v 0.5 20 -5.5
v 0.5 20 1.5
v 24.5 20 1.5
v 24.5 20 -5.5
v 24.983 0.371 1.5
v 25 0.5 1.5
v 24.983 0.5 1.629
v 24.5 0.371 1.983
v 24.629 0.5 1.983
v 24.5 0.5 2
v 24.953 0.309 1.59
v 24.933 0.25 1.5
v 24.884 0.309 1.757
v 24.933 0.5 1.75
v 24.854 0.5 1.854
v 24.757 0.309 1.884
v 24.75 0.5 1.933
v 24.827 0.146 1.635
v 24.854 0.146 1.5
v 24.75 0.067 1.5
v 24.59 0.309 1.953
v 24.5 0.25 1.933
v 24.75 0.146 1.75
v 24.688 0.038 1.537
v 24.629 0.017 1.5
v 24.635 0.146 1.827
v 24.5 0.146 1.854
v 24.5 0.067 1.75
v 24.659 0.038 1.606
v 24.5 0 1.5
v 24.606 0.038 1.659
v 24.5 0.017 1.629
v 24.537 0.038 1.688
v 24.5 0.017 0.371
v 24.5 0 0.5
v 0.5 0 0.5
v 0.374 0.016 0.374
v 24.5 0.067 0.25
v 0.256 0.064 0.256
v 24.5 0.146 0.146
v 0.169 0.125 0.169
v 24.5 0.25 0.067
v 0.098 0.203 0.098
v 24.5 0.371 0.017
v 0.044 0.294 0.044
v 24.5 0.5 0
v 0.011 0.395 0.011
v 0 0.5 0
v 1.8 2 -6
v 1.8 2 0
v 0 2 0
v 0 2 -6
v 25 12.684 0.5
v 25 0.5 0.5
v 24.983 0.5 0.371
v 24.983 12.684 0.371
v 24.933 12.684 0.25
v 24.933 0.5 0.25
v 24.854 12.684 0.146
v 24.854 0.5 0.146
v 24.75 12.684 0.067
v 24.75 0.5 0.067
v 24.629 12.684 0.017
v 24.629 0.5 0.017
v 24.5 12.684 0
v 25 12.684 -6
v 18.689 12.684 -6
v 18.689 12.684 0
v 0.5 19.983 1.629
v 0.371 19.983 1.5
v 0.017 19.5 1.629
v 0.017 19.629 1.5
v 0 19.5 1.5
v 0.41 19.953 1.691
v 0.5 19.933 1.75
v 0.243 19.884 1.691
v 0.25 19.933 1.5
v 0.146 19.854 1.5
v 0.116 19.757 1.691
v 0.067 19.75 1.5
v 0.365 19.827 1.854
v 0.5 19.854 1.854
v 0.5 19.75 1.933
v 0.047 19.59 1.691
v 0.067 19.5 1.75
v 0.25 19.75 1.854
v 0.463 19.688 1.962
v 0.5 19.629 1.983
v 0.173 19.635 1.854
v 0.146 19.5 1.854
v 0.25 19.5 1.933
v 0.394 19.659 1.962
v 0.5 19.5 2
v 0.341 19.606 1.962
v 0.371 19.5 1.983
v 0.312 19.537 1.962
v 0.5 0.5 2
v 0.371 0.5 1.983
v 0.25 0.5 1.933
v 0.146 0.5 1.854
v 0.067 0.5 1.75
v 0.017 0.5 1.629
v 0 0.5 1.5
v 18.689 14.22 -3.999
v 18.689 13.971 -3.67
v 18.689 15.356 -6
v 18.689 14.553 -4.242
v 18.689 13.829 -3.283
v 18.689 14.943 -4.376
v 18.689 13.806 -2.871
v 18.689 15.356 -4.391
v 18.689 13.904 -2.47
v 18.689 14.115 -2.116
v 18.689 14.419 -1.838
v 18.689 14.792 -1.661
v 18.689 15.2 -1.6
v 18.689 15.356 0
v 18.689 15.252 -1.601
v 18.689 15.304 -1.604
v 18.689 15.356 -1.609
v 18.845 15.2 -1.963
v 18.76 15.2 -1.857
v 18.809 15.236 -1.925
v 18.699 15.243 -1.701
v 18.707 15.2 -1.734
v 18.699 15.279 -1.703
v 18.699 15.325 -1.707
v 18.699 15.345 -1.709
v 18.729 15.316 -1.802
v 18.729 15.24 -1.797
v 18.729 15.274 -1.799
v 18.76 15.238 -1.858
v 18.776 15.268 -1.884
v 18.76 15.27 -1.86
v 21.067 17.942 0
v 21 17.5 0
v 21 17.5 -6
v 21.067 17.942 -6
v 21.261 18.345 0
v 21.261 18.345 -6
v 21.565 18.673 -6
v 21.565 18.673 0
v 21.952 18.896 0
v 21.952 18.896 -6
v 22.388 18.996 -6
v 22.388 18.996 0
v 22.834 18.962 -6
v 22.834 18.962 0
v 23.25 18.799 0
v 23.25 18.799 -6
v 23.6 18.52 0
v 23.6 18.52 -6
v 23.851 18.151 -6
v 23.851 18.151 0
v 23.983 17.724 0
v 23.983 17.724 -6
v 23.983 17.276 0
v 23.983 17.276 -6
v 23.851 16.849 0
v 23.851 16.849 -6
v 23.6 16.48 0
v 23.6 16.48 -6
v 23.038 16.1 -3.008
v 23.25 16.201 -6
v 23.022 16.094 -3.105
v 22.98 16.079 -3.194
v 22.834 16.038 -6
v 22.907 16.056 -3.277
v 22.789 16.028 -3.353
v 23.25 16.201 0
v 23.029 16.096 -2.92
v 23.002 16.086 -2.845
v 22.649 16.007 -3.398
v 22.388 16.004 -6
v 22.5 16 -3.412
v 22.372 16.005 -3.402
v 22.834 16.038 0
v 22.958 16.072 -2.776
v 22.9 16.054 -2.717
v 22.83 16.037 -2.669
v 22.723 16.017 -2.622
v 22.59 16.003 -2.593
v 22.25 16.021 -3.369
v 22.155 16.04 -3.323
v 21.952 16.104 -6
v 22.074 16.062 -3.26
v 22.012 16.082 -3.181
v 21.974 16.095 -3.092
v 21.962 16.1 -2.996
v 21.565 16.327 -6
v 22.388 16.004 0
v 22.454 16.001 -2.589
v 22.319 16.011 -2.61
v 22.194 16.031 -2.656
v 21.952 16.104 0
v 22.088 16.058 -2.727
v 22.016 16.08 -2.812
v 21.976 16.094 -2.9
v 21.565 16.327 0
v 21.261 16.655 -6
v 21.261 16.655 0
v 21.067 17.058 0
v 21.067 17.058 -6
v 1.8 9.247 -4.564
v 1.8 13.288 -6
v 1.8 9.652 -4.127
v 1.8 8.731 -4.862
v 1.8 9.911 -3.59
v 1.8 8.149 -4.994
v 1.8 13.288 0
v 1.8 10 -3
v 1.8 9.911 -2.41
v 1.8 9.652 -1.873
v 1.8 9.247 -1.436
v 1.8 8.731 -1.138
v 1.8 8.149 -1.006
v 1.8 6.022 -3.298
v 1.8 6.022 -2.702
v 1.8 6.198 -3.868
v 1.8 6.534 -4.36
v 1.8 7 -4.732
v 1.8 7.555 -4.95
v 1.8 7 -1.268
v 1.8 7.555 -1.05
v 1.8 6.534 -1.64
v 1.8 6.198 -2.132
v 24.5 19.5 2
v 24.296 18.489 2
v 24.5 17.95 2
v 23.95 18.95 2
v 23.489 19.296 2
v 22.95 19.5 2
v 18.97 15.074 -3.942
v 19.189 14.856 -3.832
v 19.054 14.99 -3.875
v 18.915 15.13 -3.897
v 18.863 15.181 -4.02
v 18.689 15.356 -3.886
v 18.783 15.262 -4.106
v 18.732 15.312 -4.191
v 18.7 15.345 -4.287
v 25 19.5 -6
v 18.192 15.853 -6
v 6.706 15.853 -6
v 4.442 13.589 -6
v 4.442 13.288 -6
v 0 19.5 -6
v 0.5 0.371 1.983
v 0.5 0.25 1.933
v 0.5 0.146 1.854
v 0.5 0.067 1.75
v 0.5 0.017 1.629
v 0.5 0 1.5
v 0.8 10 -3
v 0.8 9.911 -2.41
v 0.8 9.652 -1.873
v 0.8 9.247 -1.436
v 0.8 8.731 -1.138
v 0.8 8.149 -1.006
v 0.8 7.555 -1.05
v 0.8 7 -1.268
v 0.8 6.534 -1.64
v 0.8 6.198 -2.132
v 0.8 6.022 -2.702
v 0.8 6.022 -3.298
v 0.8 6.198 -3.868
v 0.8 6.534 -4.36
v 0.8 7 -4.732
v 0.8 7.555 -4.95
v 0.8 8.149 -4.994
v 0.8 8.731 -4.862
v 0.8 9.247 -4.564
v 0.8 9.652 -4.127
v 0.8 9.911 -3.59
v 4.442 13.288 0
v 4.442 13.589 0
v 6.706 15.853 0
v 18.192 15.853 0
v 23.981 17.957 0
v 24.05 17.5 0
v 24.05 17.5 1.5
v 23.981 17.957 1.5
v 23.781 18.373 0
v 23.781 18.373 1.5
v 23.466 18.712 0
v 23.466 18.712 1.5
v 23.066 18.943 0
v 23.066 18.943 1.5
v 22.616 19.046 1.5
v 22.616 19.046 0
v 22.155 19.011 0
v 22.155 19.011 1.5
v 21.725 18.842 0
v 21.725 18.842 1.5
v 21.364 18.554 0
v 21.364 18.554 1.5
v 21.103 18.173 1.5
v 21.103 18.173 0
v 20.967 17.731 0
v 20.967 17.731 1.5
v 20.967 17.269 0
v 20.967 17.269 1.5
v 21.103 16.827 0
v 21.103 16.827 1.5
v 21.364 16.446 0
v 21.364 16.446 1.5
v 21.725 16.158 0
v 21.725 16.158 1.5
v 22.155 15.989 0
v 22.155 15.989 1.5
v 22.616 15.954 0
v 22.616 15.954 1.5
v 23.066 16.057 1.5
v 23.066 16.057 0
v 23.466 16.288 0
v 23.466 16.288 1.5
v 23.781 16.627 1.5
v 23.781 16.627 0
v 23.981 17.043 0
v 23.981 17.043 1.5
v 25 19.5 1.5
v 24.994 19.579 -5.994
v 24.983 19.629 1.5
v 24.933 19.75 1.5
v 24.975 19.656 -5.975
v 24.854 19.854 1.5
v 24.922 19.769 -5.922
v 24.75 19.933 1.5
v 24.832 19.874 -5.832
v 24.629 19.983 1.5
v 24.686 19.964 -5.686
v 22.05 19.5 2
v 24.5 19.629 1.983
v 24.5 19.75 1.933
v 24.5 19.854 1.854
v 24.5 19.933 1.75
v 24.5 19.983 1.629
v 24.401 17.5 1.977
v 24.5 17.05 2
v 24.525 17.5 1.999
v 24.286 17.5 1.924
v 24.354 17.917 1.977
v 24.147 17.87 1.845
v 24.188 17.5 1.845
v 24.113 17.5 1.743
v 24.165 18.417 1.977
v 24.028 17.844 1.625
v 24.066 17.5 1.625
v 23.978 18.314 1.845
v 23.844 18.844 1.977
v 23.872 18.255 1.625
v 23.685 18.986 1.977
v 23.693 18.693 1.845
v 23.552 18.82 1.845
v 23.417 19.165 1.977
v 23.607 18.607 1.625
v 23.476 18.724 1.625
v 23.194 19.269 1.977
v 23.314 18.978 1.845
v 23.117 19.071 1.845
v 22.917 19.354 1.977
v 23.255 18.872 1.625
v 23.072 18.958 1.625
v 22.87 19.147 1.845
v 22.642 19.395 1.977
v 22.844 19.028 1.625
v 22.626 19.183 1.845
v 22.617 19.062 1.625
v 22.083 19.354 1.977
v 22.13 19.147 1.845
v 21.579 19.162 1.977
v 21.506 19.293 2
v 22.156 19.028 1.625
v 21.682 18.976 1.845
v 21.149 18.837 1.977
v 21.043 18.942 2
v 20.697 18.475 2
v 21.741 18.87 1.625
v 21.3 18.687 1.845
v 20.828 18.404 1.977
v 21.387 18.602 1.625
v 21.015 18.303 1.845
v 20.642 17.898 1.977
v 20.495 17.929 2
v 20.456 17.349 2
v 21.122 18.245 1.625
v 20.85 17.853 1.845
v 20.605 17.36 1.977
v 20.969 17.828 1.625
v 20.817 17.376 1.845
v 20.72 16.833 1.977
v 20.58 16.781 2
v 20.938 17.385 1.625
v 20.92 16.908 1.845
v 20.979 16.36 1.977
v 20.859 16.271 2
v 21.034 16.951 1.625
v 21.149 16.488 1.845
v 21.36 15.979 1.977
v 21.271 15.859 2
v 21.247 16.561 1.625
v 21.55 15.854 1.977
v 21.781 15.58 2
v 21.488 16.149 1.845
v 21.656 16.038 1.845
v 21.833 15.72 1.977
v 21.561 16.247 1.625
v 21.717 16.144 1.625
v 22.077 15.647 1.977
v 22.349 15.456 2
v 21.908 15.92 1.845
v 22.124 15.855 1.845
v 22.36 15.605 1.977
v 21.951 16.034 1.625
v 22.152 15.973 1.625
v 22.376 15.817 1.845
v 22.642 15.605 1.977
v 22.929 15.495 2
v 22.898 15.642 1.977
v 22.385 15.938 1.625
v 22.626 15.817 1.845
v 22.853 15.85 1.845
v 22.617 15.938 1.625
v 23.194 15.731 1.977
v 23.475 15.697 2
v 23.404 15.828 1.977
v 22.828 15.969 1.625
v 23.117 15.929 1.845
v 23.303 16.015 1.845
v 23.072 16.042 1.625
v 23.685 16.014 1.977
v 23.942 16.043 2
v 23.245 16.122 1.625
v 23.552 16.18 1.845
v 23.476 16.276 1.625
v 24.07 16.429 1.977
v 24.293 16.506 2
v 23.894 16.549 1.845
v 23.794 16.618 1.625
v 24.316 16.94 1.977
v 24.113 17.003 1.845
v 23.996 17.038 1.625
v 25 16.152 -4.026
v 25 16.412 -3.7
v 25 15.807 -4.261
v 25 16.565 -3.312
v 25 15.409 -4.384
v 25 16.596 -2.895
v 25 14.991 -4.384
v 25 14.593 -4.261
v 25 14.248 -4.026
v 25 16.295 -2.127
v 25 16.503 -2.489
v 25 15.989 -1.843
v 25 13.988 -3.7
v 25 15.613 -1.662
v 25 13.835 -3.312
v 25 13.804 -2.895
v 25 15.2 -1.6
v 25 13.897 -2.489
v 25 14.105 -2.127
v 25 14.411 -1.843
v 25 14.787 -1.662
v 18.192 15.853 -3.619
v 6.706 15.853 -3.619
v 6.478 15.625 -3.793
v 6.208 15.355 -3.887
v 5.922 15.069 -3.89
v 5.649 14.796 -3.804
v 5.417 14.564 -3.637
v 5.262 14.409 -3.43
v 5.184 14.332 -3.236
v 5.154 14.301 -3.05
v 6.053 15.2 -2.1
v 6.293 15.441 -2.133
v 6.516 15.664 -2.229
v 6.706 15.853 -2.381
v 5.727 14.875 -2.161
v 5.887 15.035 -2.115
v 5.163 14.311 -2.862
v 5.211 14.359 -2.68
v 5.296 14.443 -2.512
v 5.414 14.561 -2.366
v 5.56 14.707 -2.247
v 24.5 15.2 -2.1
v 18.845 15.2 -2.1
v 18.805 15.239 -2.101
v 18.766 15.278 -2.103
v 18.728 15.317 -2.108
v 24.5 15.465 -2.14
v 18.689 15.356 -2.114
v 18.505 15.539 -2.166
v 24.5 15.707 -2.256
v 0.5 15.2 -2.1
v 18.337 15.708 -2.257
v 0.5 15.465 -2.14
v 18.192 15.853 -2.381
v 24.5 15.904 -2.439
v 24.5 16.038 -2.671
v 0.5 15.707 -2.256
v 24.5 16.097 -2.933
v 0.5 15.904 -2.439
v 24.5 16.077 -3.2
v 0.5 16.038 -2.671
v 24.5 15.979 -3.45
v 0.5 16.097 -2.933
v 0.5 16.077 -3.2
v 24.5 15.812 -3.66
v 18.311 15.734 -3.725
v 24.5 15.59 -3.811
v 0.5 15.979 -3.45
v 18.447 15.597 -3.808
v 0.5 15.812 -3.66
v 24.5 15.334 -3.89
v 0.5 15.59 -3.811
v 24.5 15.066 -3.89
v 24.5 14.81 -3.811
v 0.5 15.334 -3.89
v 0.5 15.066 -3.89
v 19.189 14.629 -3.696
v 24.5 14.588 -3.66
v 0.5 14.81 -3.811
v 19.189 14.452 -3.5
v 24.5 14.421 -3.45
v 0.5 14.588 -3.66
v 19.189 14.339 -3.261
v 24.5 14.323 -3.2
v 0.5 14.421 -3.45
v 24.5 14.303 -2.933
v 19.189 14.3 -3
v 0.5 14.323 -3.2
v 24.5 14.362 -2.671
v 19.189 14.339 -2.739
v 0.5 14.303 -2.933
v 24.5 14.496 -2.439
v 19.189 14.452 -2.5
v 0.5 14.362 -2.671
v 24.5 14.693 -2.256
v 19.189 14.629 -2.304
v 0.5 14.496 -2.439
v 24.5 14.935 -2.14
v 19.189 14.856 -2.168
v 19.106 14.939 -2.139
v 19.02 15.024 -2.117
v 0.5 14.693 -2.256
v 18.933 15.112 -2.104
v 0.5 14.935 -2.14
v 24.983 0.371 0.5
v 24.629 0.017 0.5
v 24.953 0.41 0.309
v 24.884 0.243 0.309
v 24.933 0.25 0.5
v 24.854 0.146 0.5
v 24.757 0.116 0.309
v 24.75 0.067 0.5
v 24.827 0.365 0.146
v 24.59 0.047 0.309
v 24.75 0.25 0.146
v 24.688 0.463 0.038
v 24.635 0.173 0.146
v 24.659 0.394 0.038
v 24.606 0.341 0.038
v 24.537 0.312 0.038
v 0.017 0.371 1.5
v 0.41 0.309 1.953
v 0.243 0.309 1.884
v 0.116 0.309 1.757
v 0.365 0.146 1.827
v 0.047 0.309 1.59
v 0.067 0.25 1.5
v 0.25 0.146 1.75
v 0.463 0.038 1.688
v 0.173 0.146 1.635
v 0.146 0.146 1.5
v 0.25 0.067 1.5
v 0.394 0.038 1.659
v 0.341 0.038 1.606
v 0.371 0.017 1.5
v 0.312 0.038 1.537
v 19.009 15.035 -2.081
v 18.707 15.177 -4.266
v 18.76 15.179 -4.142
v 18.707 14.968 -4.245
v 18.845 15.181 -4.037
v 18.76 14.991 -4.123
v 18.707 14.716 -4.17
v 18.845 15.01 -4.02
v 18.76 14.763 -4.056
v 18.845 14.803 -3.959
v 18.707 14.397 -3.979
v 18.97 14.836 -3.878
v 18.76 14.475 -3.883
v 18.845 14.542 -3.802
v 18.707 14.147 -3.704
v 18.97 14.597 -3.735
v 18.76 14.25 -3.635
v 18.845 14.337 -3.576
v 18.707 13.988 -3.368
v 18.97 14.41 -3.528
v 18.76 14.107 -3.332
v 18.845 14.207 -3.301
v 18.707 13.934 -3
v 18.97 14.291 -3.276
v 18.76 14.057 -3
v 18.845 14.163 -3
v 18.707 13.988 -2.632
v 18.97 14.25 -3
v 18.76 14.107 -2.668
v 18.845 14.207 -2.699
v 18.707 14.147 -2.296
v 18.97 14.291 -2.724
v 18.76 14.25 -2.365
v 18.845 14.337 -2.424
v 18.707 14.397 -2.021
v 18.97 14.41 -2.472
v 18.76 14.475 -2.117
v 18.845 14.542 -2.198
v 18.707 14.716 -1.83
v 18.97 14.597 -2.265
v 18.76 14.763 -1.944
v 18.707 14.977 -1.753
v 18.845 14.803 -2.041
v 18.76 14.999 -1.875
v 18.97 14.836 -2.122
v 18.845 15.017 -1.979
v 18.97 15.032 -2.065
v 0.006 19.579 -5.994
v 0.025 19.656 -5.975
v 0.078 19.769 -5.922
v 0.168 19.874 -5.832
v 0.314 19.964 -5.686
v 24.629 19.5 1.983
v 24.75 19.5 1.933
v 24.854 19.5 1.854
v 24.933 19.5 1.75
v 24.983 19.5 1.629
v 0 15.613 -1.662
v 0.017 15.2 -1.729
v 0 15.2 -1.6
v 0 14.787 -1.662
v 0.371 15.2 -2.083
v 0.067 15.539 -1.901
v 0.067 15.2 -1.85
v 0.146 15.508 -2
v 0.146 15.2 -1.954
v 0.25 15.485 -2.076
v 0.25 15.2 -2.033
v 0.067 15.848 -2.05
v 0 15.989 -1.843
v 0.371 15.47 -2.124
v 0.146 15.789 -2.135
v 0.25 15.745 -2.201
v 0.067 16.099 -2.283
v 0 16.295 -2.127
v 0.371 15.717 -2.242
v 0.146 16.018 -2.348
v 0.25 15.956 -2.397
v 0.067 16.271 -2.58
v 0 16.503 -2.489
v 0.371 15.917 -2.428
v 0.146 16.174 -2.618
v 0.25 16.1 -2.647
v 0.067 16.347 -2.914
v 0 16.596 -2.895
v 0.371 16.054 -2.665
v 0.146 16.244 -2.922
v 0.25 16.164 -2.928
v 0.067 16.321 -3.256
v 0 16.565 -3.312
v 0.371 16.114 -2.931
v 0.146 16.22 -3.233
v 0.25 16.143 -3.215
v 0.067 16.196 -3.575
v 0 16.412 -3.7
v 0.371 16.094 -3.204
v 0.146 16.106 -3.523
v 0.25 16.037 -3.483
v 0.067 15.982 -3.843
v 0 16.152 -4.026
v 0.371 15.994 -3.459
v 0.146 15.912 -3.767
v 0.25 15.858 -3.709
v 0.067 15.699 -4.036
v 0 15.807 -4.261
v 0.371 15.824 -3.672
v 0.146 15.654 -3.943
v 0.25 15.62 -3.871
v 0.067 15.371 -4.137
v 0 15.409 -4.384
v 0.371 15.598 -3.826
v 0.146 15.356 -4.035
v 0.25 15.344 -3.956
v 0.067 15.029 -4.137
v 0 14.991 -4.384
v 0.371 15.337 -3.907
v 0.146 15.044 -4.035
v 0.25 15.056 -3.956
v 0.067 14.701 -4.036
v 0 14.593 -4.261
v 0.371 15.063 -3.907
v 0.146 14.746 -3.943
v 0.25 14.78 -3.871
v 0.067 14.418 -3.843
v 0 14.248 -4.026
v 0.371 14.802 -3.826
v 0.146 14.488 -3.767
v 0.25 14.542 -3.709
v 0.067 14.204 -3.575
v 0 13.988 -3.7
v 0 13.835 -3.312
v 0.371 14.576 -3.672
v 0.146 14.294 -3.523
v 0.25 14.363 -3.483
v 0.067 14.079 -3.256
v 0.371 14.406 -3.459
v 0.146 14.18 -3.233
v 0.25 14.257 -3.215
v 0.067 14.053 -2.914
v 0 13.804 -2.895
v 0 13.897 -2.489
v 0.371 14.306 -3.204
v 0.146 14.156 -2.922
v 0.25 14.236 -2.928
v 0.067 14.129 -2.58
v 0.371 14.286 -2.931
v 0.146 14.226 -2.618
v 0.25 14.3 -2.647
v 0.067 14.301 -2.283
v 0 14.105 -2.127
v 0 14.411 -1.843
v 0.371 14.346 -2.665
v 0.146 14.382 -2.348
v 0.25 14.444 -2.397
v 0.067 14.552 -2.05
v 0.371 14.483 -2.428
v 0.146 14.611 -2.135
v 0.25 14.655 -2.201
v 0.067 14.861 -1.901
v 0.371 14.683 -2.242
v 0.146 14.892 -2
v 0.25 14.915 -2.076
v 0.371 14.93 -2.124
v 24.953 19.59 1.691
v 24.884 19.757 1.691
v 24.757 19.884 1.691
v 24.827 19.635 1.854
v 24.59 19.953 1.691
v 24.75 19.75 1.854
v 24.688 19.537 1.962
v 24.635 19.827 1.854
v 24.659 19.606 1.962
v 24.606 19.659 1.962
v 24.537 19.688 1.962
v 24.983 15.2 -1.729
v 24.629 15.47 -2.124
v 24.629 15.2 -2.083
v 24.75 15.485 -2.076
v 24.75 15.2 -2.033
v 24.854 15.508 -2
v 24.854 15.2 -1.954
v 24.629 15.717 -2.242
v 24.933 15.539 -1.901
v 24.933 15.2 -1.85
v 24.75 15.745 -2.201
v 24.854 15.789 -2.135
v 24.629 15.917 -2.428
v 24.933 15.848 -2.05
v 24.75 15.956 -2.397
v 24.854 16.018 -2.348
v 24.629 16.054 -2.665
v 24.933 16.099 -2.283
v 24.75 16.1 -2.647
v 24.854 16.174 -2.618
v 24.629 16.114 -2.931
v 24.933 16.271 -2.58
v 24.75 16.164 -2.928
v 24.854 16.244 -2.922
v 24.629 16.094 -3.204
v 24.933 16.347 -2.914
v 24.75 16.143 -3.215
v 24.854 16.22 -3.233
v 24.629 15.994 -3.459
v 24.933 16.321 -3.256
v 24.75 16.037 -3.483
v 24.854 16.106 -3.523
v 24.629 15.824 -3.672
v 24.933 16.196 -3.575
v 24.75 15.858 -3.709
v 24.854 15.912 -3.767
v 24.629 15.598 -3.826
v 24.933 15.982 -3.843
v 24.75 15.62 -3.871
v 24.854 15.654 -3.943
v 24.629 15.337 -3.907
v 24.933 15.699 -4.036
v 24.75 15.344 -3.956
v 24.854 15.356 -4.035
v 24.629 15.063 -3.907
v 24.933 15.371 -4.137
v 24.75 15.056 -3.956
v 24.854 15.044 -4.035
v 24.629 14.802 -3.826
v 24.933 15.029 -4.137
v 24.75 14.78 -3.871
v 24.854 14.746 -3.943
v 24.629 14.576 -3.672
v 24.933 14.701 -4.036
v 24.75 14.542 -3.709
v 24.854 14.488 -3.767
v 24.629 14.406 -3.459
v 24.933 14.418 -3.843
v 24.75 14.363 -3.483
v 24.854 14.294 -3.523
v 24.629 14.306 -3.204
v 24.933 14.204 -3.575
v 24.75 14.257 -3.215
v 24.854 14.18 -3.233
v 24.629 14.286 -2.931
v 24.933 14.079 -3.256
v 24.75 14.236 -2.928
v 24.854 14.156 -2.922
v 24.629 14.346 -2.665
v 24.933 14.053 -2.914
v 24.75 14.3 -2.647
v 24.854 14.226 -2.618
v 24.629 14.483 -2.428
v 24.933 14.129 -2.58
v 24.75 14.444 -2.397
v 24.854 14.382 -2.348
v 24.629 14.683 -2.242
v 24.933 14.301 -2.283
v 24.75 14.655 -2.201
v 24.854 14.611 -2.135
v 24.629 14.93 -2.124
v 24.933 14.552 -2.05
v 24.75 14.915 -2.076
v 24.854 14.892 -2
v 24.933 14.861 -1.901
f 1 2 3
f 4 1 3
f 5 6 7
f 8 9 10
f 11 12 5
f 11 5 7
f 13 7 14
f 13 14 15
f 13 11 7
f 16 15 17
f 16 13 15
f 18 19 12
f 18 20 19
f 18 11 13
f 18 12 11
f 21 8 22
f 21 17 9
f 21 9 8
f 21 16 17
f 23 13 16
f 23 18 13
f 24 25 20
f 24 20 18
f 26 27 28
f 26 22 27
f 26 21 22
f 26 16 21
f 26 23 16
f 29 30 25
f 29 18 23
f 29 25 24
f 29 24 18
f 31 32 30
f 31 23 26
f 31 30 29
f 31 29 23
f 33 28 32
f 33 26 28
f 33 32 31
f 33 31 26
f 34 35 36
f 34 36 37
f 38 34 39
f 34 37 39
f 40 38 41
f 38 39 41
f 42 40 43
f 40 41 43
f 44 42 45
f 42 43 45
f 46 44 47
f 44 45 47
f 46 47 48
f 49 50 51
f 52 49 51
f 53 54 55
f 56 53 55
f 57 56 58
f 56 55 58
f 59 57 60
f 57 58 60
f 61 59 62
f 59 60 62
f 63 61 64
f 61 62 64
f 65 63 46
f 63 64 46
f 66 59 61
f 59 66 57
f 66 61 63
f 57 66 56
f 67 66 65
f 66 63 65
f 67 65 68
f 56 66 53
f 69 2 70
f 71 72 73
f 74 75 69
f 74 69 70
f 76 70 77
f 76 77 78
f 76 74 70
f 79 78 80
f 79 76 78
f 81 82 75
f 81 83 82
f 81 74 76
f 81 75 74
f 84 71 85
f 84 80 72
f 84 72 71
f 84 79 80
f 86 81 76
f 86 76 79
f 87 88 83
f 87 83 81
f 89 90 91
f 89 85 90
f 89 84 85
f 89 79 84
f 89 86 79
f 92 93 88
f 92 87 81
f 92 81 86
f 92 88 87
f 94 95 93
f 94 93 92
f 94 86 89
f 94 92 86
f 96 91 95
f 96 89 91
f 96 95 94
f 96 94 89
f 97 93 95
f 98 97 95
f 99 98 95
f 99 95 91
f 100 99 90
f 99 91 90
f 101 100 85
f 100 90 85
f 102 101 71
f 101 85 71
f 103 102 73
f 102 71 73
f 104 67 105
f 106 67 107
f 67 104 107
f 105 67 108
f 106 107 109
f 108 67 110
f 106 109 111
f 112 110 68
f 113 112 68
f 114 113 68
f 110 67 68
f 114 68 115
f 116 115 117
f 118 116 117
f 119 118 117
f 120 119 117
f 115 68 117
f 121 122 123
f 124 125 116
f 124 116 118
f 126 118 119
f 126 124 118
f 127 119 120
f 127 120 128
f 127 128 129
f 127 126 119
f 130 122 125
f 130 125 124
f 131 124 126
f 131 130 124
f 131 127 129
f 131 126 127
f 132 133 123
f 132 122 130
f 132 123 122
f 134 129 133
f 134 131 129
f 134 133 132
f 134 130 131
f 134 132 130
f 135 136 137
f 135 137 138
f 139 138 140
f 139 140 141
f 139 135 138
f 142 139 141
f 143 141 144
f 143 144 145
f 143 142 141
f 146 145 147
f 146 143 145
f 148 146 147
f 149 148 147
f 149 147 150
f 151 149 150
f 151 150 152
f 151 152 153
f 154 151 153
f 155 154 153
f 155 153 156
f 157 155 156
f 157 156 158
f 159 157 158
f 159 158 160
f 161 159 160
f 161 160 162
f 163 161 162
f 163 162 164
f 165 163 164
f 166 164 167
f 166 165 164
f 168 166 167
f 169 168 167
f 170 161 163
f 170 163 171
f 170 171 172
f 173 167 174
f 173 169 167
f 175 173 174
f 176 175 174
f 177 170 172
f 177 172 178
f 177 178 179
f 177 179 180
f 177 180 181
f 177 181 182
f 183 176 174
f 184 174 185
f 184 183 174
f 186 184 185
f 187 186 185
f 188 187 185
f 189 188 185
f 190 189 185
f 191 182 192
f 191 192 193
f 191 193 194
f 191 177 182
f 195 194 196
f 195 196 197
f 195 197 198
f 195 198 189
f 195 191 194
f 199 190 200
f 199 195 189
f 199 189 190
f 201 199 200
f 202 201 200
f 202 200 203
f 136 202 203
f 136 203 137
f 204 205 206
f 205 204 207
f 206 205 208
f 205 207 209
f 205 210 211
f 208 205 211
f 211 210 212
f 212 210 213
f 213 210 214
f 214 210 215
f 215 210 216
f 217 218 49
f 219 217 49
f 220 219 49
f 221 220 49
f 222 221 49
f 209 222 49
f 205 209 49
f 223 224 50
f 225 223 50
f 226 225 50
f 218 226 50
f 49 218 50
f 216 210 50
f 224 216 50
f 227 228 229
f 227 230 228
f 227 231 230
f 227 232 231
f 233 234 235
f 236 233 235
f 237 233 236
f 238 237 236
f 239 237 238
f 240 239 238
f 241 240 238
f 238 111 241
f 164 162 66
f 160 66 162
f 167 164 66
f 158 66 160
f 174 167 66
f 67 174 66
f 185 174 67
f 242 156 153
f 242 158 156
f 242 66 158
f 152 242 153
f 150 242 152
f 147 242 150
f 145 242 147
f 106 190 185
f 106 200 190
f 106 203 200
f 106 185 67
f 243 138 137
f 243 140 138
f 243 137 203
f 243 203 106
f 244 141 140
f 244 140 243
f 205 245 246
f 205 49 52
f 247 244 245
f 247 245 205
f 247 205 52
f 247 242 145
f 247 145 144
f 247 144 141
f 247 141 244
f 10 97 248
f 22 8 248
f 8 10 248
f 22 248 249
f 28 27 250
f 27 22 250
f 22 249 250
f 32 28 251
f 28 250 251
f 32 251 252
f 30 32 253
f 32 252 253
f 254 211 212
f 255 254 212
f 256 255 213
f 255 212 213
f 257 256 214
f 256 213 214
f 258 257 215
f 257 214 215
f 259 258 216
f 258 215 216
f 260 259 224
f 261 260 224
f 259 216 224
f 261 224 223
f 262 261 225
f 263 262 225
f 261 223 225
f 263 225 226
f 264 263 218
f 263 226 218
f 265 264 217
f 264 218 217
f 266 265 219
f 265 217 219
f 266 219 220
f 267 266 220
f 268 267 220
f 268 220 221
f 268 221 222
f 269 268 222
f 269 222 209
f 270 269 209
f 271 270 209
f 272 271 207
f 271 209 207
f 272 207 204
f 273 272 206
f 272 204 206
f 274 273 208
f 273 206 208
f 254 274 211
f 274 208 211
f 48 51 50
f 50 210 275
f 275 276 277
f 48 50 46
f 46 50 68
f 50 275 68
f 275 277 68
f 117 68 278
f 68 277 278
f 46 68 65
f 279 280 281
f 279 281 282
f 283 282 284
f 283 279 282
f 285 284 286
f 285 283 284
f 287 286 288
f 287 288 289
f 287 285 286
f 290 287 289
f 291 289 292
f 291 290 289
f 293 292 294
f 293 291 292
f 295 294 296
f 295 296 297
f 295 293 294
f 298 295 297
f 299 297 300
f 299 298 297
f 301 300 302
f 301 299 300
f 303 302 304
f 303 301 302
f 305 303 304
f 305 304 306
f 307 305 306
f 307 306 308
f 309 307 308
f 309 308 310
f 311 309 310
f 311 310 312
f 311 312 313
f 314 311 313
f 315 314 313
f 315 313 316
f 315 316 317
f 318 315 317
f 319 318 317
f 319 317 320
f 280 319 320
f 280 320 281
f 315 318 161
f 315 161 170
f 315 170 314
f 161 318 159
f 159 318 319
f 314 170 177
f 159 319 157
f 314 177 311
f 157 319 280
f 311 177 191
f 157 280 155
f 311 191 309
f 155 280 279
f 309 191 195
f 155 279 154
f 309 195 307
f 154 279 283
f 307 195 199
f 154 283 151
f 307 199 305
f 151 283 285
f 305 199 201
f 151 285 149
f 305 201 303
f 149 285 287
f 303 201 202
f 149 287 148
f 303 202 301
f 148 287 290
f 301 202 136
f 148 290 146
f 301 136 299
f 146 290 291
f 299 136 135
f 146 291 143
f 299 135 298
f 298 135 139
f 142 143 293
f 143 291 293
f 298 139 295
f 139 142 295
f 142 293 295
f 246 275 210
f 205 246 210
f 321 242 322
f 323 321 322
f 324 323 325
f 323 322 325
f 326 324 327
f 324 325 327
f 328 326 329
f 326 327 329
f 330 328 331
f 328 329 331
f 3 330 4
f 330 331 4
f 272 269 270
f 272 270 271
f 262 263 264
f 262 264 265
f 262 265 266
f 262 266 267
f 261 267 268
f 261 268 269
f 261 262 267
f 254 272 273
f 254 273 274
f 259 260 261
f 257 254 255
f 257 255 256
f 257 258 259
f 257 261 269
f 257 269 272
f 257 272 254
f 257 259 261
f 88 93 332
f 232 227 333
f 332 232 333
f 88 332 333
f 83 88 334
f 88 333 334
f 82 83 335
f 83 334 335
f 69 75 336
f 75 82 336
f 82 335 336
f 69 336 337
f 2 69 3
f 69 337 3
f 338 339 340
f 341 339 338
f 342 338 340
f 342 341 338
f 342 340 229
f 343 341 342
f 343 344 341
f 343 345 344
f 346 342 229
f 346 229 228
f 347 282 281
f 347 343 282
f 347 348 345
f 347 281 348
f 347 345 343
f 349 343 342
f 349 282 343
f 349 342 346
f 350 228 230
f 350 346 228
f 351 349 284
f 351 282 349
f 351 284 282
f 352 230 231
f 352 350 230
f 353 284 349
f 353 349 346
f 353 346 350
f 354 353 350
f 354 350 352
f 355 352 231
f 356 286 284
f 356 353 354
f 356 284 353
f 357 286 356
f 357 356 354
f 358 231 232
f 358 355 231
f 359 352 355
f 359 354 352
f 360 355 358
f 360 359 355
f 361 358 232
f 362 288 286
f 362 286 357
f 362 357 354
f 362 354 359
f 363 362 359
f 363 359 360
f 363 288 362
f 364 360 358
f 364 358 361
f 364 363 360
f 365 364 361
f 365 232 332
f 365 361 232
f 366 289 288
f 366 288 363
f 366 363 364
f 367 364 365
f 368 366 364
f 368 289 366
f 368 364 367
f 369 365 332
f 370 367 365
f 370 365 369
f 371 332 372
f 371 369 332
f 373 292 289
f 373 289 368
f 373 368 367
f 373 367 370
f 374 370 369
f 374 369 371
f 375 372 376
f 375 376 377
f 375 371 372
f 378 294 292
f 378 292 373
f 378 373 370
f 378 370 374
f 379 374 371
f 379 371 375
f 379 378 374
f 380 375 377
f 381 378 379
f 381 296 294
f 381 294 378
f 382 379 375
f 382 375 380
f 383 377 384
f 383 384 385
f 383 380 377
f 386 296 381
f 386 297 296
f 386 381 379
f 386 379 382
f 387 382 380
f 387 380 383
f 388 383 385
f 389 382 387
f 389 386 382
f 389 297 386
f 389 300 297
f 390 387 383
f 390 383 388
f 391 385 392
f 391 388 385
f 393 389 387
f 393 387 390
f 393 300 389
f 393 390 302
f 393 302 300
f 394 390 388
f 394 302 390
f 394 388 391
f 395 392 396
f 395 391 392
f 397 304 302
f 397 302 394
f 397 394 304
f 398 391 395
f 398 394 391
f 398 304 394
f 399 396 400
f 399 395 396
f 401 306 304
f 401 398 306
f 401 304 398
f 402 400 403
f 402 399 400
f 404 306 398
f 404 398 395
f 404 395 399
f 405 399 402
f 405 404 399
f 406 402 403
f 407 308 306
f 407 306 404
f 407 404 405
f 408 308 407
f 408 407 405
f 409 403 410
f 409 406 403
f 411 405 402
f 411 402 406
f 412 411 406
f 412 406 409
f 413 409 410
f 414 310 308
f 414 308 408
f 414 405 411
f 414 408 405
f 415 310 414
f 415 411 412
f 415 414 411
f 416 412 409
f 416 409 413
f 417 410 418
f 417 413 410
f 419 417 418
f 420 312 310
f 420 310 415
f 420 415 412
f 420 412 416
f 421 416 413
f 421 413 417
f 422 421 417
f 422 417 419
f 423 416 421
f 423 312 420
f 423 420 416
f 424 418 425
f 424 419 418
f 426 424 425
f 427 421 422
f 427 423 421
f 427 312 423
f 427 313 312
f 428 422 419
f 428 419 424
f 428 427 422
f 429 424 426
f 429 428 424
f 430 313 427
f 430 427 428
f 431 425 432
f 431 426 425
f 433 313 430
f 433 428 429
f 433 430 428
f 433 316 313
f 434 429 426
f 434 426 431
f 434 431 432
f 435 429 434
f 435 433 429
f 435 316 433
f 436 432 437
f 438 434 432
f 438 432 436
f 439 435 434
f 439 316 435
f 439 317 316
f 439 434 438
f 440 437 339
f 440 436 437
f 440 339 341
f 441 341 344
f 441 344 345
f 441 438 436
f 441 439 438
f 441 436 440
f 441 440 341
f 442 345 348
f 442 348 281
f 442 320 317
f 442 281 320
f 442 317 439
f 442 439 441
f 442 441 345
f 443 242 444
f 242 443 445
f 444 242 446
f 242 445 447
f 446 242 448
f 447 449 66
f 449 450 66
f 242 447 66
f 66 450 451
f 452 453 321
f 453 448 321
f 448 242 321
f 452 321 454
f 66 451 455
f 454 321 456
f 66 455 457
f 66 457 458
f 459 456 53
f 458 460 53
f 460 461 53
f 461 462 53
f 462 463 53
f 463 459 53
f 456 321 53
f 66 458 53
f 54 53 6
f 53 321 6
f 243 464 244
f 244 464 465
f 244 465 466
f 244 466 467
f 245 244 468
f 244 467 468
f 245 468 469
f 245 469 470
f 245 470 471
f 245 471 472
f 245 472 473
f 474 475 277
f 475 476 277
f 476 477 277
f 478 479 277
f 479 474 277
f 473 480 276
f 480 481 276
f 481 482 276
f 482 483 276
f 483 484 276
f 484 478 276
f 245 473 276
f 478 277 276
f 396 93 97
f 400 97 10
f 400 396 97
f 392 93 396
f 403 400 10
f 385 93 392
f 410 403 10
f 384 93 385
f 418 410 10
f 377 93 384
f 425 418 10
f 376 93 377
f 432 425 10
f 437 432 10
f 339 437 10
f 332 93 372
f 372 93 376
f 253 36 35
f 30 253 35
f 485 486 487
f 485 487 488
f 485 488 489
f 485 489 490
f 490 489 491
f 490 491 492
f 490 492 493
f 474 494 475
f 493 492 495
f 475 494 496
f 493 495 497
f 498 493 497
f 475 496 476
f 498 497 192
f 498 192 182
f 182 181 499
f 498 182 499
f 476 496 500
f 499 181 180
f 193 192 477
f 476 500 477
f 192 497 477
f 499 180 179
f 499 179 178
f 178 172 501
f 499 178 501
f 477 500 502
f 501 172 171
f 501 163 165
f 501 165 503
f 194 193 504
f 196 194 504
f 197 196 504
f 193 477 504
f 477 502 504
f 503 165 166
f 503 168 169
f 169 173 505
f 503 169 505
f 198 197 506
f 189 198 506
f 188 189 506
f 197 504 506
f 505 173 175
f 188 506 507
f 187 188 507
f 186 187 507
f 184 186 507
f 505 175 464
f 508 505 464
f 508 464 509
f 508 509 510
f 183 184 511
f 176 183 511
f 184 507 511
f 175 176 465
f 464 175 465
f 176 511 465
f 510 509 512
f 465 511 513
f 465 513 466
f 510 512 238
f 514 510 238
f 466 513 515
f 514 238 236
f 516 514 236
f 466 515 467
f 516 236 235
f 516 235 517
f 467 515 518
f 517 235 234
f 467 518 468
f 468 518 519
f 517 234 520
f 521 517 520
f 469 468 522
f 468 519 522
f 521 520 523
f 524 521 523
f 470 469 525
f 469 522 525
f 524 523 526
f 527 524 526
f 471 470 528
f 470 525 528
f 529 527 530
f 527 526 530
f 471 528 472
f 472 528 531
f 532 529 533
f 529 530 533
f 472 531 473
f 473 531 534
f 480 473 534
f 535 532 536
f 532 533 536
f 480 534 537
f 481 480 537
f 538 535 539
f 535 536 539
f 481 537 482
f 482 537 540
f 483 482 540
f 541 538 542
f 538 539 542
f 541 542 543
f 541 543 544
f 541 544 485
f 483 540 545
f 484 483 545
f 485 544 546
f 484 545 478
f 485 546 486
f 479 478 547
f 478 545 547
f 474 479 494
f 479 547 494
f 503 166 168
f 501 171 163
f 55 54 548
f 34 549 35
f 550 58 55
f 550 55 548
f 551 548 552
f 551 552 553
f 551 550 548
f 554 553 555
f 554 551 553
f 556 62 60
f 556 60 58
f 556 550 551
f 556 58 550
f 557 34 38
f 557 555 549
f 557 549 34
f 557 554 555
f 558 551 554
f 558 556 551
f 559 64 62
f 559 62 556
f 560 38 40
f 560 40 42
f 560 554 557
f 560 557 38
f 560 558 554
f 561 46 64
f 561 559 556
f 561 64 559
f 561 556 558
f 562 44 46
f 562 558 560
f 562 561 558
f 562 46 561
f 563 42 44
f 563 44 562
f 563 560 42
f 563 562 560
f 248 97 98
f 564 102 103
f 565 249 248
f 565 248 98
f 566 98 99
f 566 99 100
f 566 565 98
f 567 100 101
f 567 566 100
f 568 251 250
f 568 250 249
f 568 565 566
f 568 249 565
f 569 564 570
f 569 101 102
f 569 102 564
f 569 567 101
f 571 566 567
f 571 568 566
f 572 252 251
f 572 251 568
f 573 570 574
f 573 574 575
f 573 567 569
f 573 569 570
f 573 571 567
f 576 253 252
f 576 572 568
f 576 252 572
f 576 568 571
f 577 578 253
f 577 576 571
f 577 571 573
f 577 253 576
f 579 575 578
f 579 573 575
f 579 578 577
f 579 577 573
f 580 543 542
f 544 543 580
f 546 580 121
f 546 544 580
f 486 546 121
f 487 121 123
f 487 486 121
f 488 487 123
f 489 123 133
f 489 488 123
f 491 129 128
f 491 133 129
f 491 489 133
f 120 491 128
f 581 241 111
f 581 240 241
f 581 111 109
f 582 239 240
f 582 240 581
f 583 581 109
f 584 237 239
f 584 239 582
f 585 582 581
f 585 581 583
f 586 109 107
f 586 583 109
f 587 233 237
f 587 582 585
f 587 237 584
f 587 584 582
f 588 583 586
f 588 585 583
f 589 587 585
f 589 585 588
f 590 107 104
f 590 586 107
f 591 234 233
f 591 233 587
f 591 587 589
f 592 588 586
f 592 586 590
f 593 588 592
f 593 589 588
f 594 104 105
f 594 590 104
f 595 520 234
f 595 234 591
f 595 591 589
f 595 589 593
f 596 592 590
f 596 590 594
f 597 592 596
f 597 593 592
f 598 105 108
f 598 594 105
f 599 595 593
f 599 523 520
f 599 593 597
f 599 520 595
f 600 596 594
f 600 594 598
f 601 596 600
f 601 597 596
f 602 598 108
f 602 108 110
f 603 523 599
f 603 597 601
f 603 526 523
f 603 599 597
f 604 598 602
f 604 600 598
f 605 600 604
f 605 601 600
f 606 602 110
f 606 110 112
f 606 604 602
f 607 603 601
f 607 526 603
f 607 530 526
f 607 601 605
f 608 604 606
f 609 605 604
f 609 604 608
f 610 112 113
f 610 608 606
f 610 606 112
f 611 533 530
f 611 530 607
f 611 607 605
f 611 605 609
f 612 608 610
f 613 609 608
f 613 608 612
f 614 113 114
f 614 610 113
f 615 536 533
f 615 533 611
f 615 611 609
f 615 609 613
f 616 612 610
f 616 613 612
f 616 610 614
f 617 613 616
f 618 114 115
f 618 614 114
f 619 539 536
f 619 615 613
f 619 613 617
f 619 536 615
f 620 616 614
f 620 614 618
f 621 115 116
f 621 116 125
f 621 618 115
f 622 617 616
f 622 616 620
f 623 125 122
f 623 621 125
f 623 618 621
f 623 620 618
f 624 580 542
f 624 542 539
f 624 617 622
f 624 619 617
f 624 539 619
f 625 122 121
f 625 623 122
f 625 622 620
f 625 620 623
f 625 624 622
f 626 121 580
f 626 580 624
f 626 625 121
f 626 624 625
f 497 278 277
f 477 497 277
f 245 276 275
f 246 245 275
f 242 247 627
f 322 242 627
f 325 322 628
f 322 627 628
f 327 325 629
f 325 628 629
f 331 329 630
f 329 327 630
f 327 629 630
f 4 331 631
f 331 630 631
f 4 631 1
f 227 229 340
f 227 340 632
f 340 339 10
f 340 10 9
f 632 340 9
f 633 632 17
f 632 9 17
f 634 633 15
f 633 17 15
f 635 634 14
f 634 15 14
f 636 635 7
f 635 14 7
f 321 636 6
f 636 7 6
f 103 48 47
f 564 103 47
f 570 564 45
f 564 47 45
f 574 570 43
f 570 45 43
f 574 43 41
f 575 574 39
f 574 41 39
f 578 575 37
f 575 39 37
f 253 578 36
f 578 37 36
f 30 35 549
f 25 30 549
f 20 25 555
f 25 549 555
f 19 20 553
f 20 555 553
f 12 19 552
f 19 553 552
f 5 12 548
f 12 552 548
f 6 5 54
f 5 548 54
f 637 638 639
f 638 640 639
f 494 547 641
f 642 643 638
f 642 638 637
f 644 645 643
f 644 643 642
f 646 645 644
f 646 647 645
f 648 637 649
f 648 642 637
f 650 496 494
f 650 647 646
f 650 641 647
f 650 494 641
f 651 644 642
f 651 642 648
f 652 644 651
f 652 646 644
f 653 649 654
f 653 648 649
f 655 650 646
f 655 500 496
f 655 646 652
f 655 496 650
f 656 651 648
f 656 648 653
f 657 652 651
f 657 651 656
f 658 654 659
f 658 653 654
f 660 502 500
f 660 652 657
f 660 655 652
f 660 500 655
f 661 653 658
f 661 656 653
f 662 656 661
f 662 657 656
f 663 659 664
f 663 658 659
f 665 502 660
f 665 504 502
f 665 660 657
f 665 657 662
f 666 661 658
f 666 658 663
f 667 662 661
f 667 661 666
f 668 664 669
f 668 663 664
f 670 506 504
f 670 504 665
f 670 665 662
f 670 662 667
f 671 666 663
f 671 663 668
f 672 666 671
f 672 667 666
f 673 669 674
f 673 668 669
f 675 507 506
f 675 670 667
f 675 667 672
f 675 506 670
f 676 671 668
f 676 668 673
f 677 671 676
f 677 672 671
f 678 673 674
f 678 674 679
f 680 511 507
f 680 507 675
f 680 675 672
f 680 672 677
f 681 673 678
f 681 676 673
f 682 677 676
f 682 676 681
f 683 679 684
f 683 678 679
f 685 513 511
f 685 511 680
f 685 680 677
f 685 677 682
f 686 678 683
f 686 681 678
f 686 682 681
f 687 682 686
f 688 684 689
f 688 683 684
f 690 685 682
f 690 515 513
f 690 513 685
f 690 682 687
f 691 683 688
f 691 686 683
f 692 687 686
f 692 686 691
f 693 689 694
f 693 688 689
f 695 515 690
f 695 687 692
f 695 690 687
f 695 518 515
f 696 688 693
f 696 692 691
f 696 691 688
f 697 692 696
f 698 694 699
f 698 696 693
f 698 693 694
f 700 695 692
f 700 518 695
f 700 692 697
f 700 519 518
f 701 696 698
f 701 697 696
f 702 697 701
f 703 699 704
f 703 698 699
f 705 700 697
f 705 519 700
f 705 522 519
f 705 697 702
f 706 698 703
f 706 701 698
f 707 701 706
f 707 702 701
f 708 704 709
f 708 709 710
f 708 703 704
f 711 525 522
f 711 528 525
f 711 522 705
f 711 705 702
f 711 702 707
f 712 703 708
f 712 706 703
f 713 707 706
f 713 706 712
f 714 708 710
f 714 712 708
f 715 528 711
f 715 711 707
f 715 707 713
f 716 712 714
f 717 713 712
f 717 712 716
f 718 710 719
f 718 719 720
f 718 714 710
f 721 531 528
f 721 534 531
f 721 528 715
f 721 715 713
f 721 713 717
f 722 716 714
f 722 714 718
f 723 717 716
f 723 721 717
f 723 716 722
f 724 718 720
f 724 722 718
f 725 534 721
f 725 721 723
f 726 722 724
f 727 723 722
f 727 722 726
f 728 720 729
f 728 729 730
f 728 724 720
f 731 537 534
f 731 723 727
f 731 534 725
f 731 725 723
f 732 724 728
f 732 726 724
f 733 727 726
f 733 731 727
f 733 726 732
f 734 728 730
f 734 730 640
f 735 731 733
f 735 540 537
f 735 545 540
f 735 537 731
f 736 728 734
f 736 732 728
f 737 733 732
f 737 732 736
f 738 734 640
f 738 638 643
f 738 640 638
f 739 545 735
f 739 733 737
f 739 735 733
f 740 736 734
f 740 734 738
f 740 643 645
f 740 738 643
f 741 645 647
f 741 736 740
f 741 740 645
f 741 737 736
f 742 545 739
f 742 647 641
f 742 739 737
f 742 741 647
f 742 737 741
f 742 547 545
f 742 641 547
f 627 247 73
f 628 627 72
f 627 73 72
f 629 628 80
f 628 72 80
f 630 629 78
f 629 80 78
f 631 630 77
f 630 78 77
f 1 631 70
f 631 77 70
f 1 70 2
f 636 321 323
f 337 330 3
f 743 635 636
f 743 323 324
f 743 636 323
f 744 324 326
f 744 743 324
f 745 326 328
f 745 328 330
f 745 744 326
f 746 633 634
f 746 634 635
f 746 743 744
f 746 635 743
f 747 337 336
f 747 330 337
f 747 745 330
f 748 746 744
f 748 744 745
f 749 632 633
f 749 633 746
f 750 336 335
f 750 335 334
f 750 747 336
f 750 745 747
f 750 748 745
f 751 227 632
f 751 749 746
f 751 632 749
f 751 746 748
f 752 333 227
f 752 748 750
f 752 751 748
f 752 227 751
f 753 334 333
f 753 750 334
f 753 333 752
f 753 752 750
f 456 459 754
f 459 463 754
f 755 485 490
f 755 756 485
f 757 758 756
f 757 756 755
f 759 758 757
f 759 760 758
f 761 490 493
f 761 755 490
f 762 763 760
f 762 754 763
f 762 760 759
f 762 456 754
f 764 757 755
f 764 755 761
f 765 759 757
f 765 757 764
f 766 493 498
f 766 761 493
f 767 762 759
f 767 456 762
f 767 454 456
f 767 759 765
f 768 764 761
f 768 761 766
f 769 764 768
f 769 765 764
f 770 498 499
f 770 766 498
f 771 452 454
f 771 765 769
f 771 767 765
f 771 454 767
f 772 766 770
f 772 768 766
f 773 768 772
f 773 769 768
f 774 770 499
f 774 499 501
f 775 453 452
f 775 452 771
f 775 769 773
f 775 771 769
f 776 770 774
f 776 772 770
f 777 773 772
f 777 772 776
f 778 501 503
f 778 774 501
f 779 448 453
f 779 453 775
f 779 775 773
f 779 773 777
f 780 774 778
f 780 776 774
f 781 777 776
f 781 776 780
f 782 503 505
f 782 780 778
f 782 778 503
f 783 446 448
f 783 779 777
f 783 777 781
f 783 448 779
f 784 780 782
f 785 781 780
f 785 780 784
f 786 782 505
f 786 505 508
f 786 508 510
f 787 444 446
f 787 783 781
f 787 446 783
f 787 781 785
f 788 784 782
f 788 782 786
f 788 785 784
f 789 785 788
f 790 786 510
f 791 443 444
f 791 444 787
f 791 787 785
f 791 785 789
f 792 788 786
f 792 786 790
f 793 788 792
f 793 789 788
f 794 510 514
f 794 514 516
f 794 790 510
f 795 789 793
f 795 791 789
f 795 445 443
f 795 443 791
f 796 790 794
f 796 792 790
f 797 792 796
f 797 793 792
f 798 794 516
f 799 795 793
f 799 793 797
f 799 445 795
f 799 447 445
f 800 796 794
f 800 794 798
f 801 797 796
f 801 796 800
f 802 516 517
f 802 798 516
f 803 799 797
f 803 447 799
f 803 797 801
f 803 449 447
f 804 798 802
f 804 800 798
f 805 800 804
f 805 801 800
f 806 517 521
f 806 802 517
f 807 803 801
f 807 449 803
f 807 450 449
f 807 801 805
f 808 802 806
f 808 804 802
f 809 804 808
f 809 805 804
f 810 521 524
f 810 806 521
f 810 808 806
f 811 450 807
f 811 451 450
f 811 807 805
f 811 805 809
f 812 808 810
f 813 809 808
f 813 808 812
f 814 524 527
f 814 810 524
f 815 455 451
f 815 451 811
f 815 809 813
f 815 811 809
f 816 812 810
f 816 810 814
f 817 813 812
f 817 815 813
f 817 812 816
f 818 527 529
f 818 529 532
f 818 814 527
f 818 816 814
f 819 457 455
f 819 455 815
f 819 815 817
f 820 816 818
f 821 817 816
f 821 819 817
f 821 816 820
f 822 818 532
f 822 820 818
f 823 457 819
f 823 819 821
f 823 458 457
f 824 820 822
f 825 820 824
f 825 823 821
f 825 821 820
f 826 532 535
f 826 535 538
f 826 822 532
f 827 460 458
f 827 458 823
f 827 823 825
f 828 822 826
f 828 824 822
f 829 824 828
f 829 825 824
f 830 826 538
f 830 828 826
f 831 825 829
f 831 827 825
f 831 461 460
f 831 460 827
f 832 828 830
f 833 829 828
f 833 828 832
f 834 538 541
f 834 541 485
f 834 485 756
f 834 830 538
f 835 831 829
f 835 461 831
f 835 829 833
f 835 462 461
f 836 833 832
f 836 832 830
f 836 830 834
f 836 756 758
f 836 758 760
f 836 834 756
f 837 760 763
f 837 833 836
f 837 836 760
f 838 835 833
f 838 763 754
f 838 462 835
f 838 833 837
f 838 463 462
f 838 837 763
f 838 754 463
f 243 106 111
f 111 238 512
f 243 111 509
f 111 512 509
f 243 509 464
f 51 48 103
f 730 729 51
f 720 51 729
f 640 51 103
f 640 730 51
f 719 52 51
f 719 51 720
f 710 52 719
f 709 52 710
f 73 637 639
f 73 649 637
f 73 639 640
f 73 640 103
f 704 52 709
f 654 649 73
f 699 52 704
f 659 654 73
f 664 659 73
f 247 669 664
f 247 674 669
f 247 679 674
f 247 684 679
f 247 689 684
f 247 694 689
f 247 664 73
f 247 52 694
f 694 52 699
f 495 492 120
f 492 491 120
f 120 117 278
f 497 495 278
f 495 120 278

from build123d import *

# Parameters (mm, degrees)
ESQUISSE1_W             = 25
ESQUISSE1_H             = 20
ESQUISSE1_R             = 1.55
BOSS_EXTRU_1_DEPTH      = 2
ESQUISSE2_R             = 1.5
BOSS_EXTRU_2_DEPTH      = 6
ESQUISSE3_R             = 2
ENL_V_MAT_EXTRU_1_DEPTH = 1
ESQUISSE4_R             = 0.9
ENL_V_MAT_EXTRU_2_DEPTH = 33.57299495
CONG_1_R                = 0.5
CONG_5_R                = 0.5
CONG_6_R                = 0.5


with BuildPart() as part:
    # Esquisse1 → Boss.-Extru.1 (new body)
    with BuildSketch(Plane.XY):
        with Locations((12.5, 10)):
            Rectangle(ESQUISSE1_W, ESQUISSE1_H)
        with Locations((22.5, 17.5)):
            Circle(ESQUISSE1_R, mode=Mode.SUBTRACT)
    extrude(amount=BOSS_EXTRU_1_DEPTH)

    # Esquisse2 → Boss.-Extru.2 (add)
    with BuildSketch(Plane(origin=(0, 0, 0), x_dir=(-1, 0, 0), z_dir=(0, 0, -1))):
        Polygon((-18.688890735, 12.684019913), (-18.688890735, 15.355693182), (-18.19165929, 15.852924628), (-6.705637613, 15.852924628), (-4.442134245, 13.58942126), (-4.442134245, 13.288407081), (-1.8, 13.288407081), (-1.8, 2), (0, 2), (0, 13.565515823), (0, 20), (-25, 20), (-25, 12.684019913), align=None)
        with Locations((-22.5, 17.5)):
            Circle(ESQUISSE2_R, mode=Mode.SUBTRACT)
    extrude(amount=BOSS_EXTRU_2_DEPTH)

    # Esquisse3 → Enlèv. mat.-Extru.1 (cut)
    with BuildSketch(Plane(origin=(1.8, 0, 0), x_dir=(0, 0, -1), z_dir=(1, 0, 0))):
        with Locations(Location((3, 8, 0), (0, 0, 90))):
            Circle(ESQUISSE3_R)
    extrude(amount=-ENL_V_MAT_EXTRU_1_DEPTH, mode=Mode.SUBTRACT)

    # Esquisse4 → Enlèv. mat.-Extru.2 (cut, through all)
    with BuildSketch(Plane.ZY):
        with Locations((-3, 15.2)):
            Circle(ESQUISSE4_R)
    extrude(amount=-ENL_V_MAT_EXTRU_2_DEPTH, mode=Mode.SUBTRACT)

    # Congé1
    # the kernel refuses this fillet: 0.5 mm, written as the material it takes off along each edge
    with BuildSketch(Plane(origin=(25, 15.2, -3), x_dir=(0, 0, 1), z_dir=(0, -1, 0))) as cong_1_piece_1:
        with BuildLine():
            CenterArc((0.9 + CONG_1_R, CONG_1_R), CONG_1_R, 180, 90)
            Line((0.9, CONG_1_R), (0.9, 0))
            Line((0.9, 0), (0.9 + CONG_1_R, 0))
        make_face()
    revolve(axis=Axis((25, 15.2, -3), (-1, 0, 0)), mode=Mode.SUBTRACT)
    with BuildSketch(Plane(origin=(18.688890735, 15.2, -3), x_dir=(0, 0.9999845857082649, -0.005552327968503009), z_dir=(0, 0.005552327968503009, 0.9999845857082649))) as cong_1_piece_2_section:
        with BuildLine():
            CenterArc((0.9 + CONG_1_R, -CONG_1_R), CONG_1_R, 90, 90)
            Line((0.9 + CONG_1_R, 0), (0.9, 0))
            Line((0.9, 0), (0.9, -CONG_1_R))
        make_face()
    cong_1_piece_2 = revolve(axis=Axis((18.688890735, 15.2, -3), (-1, 0, 0)), revolution_arc=269.681873406, mode=Mode.PRIVATE)
    cong_1_piece_2 = split(cong_1_piece_2, bisect_by=Plane(origin=(19.358402527, 14.68618139, -3.05957258), z_dir=(-0.7071067811865438, -0.7071067811865513, 0)), keep=Keep.TOP, mode=Mode.PRIVATE)
    add(cong_1_piece_2, mode=Mode.SUBTRACT)
    with BuildSketch(Plane(origin=(0, 15.2, -3), x_dir=(0, 0, 1), z_dir=(0, -1, 0))) as cong_1_piece_3:
        with BuildLine():
            CenterArc((0.9 + CONG_1_R, -CONG_1_R), CONG_1_R, 90, 90)
            Line((0.9, -CONG_1_R), (0.9, 0))
            Line((0.9, 0), (0.9 + CONG_1_R, 0))
        make_face()
    revolve(axis=Axis((0, 15.2, -3), (-1, 0, 0)), mode=Mode.SUBTRACT)
    with BuildSketch(Plane(origin=(18.688890735, 15.2, -3), x_dir=(0, 0, 1), z_dir=(0, -1, 0))) as cong_1_piece_4_section:
        with BuildLine():
            CenterArc((0.9 + CONG_1_R, -CONG_1_R), CONG_1_R, 90, 90)
            Line((0.9 + CONG_1_R, 0), (0.9, 0))
            Line((0.9, 0), (0.9, -CONG_1_R))
        make_face()
    cong_1_piece_4 = revolve(axis=Axis((18.688890735, 15.2, -3), (-1, 0, 0)), revolution_arc=89.539713829, mode=Mode.PRIVATE)
    cong_1_piece_4 = split(cong_1_piece_4, bisect_by=Plane(origin=(18.759427014, 15.285156904, -1.94281096), z_dir=(-0.7071067811865438, -0.7071067811865513, 0)), keep=Keep.TOP, mode=Mode.PRIVATE)
    add(cong_1_piece_4, mode=Mode.SUBTRACT)

    # Congé5
    # the kernel refuses this fillet: 0.5 mm, written as the material it takes off along each edge
    with BuildSketch(Plane(origin=(24.5, 0.5, 1.5), x_dir=(0, 0, 1), z_dir=(0, -1, 0))) as cong_5_piece_1_section:
        Polygon((0, 0), (CONG_5_R, 0), (CONG_5_R, -CONG_5_R), (0, -CONG_5_R), align=None)
    cong_5_piece_1 = extrude(amount=CONG_5_R, mode=Mode.PRIVATE)
    cong_5_piece_1 = cong_5_piece_1 - Plane(origin=(24.5, 0.5, 1.5), x_dir=(-0.7071067811865475, 0, -0.7071067811865475), z_dir=(0, -1, 0)) * Sphere(CONG_5_R, mode=Mode.PRIVATE)
    add(cong_5_piece_1, mode=Mode.SUBTRACT)
    with BuildSketch(Plane(origin=(24.5, 19.5, 1.5), x_dir=(1, 0, 0), z_dir=(0, 0, 1))) as cong_5_piece_2_section:
        Polygon((0, 0), (CONG_5_R, 0), (CONG_5_R, CONG_5_R), (0, CONG_5_R), align=None)
    cong_5_piece_2 = extrude(amount=CONG_5_R, mode=Mode.PRIVATE)
    cong_5_piece_2 = cong_5_piece_2 - Plane(origin=(24.5, 19.5, 1.5), x_dir=(-0.7071067811865475, -0.7071067811865475, 0), z_dir=(0, 0, 1)) * Sphere(CONG_5_R, mode=Mode.PRIVATE)
    add(cong_5_piece_2, mode=Mode.SUBTRACT)
    with BuildSketch(Plane(origin=(0.5, 19.5, 1.5), x_dir=(-1, 0, 0), z_dir=(0, 0, 1))) as cong_5_piece_3_section:
        Polygon((0, 0), (CONG_5_R, 0), (CONG_5_R, -CONG_5_R), (0, -CONG_5_R), align=None)
    cong_5_piece_3 = extrude(amount=CONG_5_R, mode=Mode.PRIVATE)
    cong_5_piece_3 = cong_5_piece_3 - Plane(origin=(0.5, 19.5, 1.5), x_dir=(0.7071067811865475, -0.7071067811865475, 0), z_dir=(0, 0, 1)) * Sphere(CONG_5_R, mode=Mode.PRIVATE)
    add(cong_5_piece_3, mode=Mode.SUBTRACT)
    with BuildSketch(Plane(origin=(0.5, 0.5, 1.5), x_dir=(0, 0, 1), z_dir=(0, -1, 0))) as cong_5_piece_4_section:
        Polygon((0, 0), (CONG_5_R, 0), (CONG_5_R, CONG_5_R), (0, CONG_5_R), align=None)
    cong_5_piece_4 = extrude(amount=CONG_5_R, mode=Mode.PRIVATE)
    cong_5_piece_4 = cong_5_piece_4 - Plane(origin=(0.5, 0.5, 1.5), x_dir=(0.7071067811865475, 0, -0.7071067811865475), z_dir=(0, -1, 0)) * Sphere(CONG_5_R, mode=Mode.PRIVATE)
    add(cong_5_piece_4, mode=Mode.SUBTRACT)
    with BuildSketch(Plane(origin=(22.5, 17.5, 2), x_dir=(1, 0, 0), z_dir=(0, -1, 0))) as cong_5_piece_5:
        with BuildLine():
            CenterArc((1.55 + CONG_5_R, -CONG_5_R), CONG_5_R, 90, 90)
            Line((1.55, -CONG_5_R), (1.55, 0))
            Line((1.55, 0), (1.55 + CONG_5_R, 0))
        make_face()
    revolve(axis=Axis((22.5, 17.5, 2), (0, 0, 1)), mode=Mode.SUBTRACT)
    with BuildSketch(Plane(origin=(25, 0.5, 2), x_dir=(-1, 0, 0), z_dir=(0, 1, 0)), Plane(origin=(0, 19.5, 2), x_dir=(1, 0, 0), z_dir=(0, -1, 0))) as cong_5_piece_6:
        with BuildLine():
            CenterArc((CONG_5_R, -CONG_5_R), CONG_5_R, 90, 90)
            Line((0, -CONG_5_R), (0, 0))
            Line((0, 0), (CONG_5_R, 0))
        make_face()
    extrude(amount=19, mode=Mode.SUBTRACT)
    with BuildSketch(Plane(origin=(24.5, 20, 2), x_dir=(0, -1, 0), z_dir=(-1, 0, 0))) as cong_5_piece_7:
        with BuildLine():
            CenterArc((CONG_5_R, -CONG_5_R), CONG_5_R, 90, 90)
            Line((0, -CONG_5_R), (0, 0))
            Line((0, 0), (CONG_5_R, 0))
        make_face()
    extrude(amount=24, mode=Mode.SUBTRACT)
    with BuildSketch(Plane(origin=(-1.25, 20, -6), x_dir=(0, -1, 0), z_dir=(1, 0, 0)), Plane(origin=(-1.25, 0, 0), x_dir=(0, 0, 1), z_dir=(1, 0, 0))) as cong_5_piece_8:
        with BuildLine():
            CenterArc((CONG_5_R, -CONG_5_R), CONG_5_R, 90, 90)
            Line((0, -CONG_5_R), (0, 0))
            Line((0, 0), (CONG_5_R, 0))
        make_face()
    extrude(amount=27.5, mode=Mode.SUBTRACT)
    with BuildSketch(Plane(origin=(0, 20, 1.5), x_dir=(1, 0, 0), z_dir=(0, 0, -1)), Plane(origin=(25, 20, -7.25), x_dir=(-1, 0, 0), z_dir=(0, 0, 1))) as cong_5_piece_9:
        with BuildLine():
            CenterArc((CONG_5_R, CONG_5_R), CONG_5_R, 180, 90)
            Line((0, CONG_5_R), (0, 0))
            Line((0, 0), (CONG_5_R, 0))
        make_face()
    extrude(amount=8.75, mode=Mode.SUBTRACT)
    with BuildSketch(Plane(origin=(25, 0, -1.25), x_dir=(-1, 0, 0), z_dir=(0, 0, 1))) as cong_5_piece_10:
        with BuildLine():
            CenterArc((CONG_5_R, -CONG_5_R), CONG_5_R, 90, 90)
            Line((0, -CONG_5_R), (0, 0))
            Line((0, 0), (CONG_5_R, 0))
        make_face()
    extrude(amount=2.75, mode=Mode.SUBTRACT)
    with BuildSketch(Plane(origin=(0, 0, -1.25), x_dir=(1, 0, 0), z_dir=(0, 0, 1))) as cong_5_piece_11:
        with BuildLine():
            CenterArc((CONG_5_R, CONG_5_R), CONG_5_R, 180, 90)
            Line((0, CONG_5_R), (0, 0))
            Line((0, 0), (CONG_5_R, 0))
        make_face()
    extrude(amount=2.75, mode=Mode.SUBTRACT)
    with BuildSketch(Plane(origin=(0.5, 0, 2), x_dir=(0, 0, -1), z_dir=(1, 0, 0))) as cong_5_piece_12:
        with BuildLine():
            CenterArc((CONG_5_R, CONG_5_R), CONG_5_R, 180, 90)
            Line((0, CONG_5_R), (0, 0))
            Line((0, 0), (CONG_5_R, 0))
        make_face()
    extrude(amount=24, mode=Mode.SUBTRACT)

    # Congé6
    # the kernel refuses this fillet: 0.5 mm, written as the material it takes off along each edge
    with BuildSketch(Plane(origin=(24.5, 0.5, 0.5), x_dir=(1, 0, 0), z_dir=(0, 0, -1))) as cong_6_piece_1_section:
        Polygon((0, 0), (CONG_6_R, 0), (CONG_6_R, CONG_6_R), (0, CONG_6_R), align=None)
    cong_6_piece_1 = extrude(amount=CONG_6_R, mode=Mode.PRIVATE)
    cong_6_piece_1 = cong_6_piece_1 - Plane(origin=(24.5, 0.5, 0.5), x_dir=(-0.7071067811865475, 0.7071067811865475, 0), z_dir=(0, 0, -1)) * Sphere(CONG_6_R, mode=Mode.PRIVATE)
    add(cong_6_piece_1, mode=Mode.SUBTRACT)
    with BuildSketch(Plane(origin=(25, 0.5, 0), x_dir=(-1, 0, 0), z_dir=(0, 1, 0))) as cong_6_piece_2:
        with BuildLine():
            CenterArc((CONG_6_R, CONG_6_R), CONG_6_R, 180, 90)
            Line((0, CONG_6_R), (0, 0))
            Line((0, 0), (CONG_6_R, 0))
        make_face()
    extrude(amount=12.184019913, mode=Mode.SUBTRACT)


solid = part.part
